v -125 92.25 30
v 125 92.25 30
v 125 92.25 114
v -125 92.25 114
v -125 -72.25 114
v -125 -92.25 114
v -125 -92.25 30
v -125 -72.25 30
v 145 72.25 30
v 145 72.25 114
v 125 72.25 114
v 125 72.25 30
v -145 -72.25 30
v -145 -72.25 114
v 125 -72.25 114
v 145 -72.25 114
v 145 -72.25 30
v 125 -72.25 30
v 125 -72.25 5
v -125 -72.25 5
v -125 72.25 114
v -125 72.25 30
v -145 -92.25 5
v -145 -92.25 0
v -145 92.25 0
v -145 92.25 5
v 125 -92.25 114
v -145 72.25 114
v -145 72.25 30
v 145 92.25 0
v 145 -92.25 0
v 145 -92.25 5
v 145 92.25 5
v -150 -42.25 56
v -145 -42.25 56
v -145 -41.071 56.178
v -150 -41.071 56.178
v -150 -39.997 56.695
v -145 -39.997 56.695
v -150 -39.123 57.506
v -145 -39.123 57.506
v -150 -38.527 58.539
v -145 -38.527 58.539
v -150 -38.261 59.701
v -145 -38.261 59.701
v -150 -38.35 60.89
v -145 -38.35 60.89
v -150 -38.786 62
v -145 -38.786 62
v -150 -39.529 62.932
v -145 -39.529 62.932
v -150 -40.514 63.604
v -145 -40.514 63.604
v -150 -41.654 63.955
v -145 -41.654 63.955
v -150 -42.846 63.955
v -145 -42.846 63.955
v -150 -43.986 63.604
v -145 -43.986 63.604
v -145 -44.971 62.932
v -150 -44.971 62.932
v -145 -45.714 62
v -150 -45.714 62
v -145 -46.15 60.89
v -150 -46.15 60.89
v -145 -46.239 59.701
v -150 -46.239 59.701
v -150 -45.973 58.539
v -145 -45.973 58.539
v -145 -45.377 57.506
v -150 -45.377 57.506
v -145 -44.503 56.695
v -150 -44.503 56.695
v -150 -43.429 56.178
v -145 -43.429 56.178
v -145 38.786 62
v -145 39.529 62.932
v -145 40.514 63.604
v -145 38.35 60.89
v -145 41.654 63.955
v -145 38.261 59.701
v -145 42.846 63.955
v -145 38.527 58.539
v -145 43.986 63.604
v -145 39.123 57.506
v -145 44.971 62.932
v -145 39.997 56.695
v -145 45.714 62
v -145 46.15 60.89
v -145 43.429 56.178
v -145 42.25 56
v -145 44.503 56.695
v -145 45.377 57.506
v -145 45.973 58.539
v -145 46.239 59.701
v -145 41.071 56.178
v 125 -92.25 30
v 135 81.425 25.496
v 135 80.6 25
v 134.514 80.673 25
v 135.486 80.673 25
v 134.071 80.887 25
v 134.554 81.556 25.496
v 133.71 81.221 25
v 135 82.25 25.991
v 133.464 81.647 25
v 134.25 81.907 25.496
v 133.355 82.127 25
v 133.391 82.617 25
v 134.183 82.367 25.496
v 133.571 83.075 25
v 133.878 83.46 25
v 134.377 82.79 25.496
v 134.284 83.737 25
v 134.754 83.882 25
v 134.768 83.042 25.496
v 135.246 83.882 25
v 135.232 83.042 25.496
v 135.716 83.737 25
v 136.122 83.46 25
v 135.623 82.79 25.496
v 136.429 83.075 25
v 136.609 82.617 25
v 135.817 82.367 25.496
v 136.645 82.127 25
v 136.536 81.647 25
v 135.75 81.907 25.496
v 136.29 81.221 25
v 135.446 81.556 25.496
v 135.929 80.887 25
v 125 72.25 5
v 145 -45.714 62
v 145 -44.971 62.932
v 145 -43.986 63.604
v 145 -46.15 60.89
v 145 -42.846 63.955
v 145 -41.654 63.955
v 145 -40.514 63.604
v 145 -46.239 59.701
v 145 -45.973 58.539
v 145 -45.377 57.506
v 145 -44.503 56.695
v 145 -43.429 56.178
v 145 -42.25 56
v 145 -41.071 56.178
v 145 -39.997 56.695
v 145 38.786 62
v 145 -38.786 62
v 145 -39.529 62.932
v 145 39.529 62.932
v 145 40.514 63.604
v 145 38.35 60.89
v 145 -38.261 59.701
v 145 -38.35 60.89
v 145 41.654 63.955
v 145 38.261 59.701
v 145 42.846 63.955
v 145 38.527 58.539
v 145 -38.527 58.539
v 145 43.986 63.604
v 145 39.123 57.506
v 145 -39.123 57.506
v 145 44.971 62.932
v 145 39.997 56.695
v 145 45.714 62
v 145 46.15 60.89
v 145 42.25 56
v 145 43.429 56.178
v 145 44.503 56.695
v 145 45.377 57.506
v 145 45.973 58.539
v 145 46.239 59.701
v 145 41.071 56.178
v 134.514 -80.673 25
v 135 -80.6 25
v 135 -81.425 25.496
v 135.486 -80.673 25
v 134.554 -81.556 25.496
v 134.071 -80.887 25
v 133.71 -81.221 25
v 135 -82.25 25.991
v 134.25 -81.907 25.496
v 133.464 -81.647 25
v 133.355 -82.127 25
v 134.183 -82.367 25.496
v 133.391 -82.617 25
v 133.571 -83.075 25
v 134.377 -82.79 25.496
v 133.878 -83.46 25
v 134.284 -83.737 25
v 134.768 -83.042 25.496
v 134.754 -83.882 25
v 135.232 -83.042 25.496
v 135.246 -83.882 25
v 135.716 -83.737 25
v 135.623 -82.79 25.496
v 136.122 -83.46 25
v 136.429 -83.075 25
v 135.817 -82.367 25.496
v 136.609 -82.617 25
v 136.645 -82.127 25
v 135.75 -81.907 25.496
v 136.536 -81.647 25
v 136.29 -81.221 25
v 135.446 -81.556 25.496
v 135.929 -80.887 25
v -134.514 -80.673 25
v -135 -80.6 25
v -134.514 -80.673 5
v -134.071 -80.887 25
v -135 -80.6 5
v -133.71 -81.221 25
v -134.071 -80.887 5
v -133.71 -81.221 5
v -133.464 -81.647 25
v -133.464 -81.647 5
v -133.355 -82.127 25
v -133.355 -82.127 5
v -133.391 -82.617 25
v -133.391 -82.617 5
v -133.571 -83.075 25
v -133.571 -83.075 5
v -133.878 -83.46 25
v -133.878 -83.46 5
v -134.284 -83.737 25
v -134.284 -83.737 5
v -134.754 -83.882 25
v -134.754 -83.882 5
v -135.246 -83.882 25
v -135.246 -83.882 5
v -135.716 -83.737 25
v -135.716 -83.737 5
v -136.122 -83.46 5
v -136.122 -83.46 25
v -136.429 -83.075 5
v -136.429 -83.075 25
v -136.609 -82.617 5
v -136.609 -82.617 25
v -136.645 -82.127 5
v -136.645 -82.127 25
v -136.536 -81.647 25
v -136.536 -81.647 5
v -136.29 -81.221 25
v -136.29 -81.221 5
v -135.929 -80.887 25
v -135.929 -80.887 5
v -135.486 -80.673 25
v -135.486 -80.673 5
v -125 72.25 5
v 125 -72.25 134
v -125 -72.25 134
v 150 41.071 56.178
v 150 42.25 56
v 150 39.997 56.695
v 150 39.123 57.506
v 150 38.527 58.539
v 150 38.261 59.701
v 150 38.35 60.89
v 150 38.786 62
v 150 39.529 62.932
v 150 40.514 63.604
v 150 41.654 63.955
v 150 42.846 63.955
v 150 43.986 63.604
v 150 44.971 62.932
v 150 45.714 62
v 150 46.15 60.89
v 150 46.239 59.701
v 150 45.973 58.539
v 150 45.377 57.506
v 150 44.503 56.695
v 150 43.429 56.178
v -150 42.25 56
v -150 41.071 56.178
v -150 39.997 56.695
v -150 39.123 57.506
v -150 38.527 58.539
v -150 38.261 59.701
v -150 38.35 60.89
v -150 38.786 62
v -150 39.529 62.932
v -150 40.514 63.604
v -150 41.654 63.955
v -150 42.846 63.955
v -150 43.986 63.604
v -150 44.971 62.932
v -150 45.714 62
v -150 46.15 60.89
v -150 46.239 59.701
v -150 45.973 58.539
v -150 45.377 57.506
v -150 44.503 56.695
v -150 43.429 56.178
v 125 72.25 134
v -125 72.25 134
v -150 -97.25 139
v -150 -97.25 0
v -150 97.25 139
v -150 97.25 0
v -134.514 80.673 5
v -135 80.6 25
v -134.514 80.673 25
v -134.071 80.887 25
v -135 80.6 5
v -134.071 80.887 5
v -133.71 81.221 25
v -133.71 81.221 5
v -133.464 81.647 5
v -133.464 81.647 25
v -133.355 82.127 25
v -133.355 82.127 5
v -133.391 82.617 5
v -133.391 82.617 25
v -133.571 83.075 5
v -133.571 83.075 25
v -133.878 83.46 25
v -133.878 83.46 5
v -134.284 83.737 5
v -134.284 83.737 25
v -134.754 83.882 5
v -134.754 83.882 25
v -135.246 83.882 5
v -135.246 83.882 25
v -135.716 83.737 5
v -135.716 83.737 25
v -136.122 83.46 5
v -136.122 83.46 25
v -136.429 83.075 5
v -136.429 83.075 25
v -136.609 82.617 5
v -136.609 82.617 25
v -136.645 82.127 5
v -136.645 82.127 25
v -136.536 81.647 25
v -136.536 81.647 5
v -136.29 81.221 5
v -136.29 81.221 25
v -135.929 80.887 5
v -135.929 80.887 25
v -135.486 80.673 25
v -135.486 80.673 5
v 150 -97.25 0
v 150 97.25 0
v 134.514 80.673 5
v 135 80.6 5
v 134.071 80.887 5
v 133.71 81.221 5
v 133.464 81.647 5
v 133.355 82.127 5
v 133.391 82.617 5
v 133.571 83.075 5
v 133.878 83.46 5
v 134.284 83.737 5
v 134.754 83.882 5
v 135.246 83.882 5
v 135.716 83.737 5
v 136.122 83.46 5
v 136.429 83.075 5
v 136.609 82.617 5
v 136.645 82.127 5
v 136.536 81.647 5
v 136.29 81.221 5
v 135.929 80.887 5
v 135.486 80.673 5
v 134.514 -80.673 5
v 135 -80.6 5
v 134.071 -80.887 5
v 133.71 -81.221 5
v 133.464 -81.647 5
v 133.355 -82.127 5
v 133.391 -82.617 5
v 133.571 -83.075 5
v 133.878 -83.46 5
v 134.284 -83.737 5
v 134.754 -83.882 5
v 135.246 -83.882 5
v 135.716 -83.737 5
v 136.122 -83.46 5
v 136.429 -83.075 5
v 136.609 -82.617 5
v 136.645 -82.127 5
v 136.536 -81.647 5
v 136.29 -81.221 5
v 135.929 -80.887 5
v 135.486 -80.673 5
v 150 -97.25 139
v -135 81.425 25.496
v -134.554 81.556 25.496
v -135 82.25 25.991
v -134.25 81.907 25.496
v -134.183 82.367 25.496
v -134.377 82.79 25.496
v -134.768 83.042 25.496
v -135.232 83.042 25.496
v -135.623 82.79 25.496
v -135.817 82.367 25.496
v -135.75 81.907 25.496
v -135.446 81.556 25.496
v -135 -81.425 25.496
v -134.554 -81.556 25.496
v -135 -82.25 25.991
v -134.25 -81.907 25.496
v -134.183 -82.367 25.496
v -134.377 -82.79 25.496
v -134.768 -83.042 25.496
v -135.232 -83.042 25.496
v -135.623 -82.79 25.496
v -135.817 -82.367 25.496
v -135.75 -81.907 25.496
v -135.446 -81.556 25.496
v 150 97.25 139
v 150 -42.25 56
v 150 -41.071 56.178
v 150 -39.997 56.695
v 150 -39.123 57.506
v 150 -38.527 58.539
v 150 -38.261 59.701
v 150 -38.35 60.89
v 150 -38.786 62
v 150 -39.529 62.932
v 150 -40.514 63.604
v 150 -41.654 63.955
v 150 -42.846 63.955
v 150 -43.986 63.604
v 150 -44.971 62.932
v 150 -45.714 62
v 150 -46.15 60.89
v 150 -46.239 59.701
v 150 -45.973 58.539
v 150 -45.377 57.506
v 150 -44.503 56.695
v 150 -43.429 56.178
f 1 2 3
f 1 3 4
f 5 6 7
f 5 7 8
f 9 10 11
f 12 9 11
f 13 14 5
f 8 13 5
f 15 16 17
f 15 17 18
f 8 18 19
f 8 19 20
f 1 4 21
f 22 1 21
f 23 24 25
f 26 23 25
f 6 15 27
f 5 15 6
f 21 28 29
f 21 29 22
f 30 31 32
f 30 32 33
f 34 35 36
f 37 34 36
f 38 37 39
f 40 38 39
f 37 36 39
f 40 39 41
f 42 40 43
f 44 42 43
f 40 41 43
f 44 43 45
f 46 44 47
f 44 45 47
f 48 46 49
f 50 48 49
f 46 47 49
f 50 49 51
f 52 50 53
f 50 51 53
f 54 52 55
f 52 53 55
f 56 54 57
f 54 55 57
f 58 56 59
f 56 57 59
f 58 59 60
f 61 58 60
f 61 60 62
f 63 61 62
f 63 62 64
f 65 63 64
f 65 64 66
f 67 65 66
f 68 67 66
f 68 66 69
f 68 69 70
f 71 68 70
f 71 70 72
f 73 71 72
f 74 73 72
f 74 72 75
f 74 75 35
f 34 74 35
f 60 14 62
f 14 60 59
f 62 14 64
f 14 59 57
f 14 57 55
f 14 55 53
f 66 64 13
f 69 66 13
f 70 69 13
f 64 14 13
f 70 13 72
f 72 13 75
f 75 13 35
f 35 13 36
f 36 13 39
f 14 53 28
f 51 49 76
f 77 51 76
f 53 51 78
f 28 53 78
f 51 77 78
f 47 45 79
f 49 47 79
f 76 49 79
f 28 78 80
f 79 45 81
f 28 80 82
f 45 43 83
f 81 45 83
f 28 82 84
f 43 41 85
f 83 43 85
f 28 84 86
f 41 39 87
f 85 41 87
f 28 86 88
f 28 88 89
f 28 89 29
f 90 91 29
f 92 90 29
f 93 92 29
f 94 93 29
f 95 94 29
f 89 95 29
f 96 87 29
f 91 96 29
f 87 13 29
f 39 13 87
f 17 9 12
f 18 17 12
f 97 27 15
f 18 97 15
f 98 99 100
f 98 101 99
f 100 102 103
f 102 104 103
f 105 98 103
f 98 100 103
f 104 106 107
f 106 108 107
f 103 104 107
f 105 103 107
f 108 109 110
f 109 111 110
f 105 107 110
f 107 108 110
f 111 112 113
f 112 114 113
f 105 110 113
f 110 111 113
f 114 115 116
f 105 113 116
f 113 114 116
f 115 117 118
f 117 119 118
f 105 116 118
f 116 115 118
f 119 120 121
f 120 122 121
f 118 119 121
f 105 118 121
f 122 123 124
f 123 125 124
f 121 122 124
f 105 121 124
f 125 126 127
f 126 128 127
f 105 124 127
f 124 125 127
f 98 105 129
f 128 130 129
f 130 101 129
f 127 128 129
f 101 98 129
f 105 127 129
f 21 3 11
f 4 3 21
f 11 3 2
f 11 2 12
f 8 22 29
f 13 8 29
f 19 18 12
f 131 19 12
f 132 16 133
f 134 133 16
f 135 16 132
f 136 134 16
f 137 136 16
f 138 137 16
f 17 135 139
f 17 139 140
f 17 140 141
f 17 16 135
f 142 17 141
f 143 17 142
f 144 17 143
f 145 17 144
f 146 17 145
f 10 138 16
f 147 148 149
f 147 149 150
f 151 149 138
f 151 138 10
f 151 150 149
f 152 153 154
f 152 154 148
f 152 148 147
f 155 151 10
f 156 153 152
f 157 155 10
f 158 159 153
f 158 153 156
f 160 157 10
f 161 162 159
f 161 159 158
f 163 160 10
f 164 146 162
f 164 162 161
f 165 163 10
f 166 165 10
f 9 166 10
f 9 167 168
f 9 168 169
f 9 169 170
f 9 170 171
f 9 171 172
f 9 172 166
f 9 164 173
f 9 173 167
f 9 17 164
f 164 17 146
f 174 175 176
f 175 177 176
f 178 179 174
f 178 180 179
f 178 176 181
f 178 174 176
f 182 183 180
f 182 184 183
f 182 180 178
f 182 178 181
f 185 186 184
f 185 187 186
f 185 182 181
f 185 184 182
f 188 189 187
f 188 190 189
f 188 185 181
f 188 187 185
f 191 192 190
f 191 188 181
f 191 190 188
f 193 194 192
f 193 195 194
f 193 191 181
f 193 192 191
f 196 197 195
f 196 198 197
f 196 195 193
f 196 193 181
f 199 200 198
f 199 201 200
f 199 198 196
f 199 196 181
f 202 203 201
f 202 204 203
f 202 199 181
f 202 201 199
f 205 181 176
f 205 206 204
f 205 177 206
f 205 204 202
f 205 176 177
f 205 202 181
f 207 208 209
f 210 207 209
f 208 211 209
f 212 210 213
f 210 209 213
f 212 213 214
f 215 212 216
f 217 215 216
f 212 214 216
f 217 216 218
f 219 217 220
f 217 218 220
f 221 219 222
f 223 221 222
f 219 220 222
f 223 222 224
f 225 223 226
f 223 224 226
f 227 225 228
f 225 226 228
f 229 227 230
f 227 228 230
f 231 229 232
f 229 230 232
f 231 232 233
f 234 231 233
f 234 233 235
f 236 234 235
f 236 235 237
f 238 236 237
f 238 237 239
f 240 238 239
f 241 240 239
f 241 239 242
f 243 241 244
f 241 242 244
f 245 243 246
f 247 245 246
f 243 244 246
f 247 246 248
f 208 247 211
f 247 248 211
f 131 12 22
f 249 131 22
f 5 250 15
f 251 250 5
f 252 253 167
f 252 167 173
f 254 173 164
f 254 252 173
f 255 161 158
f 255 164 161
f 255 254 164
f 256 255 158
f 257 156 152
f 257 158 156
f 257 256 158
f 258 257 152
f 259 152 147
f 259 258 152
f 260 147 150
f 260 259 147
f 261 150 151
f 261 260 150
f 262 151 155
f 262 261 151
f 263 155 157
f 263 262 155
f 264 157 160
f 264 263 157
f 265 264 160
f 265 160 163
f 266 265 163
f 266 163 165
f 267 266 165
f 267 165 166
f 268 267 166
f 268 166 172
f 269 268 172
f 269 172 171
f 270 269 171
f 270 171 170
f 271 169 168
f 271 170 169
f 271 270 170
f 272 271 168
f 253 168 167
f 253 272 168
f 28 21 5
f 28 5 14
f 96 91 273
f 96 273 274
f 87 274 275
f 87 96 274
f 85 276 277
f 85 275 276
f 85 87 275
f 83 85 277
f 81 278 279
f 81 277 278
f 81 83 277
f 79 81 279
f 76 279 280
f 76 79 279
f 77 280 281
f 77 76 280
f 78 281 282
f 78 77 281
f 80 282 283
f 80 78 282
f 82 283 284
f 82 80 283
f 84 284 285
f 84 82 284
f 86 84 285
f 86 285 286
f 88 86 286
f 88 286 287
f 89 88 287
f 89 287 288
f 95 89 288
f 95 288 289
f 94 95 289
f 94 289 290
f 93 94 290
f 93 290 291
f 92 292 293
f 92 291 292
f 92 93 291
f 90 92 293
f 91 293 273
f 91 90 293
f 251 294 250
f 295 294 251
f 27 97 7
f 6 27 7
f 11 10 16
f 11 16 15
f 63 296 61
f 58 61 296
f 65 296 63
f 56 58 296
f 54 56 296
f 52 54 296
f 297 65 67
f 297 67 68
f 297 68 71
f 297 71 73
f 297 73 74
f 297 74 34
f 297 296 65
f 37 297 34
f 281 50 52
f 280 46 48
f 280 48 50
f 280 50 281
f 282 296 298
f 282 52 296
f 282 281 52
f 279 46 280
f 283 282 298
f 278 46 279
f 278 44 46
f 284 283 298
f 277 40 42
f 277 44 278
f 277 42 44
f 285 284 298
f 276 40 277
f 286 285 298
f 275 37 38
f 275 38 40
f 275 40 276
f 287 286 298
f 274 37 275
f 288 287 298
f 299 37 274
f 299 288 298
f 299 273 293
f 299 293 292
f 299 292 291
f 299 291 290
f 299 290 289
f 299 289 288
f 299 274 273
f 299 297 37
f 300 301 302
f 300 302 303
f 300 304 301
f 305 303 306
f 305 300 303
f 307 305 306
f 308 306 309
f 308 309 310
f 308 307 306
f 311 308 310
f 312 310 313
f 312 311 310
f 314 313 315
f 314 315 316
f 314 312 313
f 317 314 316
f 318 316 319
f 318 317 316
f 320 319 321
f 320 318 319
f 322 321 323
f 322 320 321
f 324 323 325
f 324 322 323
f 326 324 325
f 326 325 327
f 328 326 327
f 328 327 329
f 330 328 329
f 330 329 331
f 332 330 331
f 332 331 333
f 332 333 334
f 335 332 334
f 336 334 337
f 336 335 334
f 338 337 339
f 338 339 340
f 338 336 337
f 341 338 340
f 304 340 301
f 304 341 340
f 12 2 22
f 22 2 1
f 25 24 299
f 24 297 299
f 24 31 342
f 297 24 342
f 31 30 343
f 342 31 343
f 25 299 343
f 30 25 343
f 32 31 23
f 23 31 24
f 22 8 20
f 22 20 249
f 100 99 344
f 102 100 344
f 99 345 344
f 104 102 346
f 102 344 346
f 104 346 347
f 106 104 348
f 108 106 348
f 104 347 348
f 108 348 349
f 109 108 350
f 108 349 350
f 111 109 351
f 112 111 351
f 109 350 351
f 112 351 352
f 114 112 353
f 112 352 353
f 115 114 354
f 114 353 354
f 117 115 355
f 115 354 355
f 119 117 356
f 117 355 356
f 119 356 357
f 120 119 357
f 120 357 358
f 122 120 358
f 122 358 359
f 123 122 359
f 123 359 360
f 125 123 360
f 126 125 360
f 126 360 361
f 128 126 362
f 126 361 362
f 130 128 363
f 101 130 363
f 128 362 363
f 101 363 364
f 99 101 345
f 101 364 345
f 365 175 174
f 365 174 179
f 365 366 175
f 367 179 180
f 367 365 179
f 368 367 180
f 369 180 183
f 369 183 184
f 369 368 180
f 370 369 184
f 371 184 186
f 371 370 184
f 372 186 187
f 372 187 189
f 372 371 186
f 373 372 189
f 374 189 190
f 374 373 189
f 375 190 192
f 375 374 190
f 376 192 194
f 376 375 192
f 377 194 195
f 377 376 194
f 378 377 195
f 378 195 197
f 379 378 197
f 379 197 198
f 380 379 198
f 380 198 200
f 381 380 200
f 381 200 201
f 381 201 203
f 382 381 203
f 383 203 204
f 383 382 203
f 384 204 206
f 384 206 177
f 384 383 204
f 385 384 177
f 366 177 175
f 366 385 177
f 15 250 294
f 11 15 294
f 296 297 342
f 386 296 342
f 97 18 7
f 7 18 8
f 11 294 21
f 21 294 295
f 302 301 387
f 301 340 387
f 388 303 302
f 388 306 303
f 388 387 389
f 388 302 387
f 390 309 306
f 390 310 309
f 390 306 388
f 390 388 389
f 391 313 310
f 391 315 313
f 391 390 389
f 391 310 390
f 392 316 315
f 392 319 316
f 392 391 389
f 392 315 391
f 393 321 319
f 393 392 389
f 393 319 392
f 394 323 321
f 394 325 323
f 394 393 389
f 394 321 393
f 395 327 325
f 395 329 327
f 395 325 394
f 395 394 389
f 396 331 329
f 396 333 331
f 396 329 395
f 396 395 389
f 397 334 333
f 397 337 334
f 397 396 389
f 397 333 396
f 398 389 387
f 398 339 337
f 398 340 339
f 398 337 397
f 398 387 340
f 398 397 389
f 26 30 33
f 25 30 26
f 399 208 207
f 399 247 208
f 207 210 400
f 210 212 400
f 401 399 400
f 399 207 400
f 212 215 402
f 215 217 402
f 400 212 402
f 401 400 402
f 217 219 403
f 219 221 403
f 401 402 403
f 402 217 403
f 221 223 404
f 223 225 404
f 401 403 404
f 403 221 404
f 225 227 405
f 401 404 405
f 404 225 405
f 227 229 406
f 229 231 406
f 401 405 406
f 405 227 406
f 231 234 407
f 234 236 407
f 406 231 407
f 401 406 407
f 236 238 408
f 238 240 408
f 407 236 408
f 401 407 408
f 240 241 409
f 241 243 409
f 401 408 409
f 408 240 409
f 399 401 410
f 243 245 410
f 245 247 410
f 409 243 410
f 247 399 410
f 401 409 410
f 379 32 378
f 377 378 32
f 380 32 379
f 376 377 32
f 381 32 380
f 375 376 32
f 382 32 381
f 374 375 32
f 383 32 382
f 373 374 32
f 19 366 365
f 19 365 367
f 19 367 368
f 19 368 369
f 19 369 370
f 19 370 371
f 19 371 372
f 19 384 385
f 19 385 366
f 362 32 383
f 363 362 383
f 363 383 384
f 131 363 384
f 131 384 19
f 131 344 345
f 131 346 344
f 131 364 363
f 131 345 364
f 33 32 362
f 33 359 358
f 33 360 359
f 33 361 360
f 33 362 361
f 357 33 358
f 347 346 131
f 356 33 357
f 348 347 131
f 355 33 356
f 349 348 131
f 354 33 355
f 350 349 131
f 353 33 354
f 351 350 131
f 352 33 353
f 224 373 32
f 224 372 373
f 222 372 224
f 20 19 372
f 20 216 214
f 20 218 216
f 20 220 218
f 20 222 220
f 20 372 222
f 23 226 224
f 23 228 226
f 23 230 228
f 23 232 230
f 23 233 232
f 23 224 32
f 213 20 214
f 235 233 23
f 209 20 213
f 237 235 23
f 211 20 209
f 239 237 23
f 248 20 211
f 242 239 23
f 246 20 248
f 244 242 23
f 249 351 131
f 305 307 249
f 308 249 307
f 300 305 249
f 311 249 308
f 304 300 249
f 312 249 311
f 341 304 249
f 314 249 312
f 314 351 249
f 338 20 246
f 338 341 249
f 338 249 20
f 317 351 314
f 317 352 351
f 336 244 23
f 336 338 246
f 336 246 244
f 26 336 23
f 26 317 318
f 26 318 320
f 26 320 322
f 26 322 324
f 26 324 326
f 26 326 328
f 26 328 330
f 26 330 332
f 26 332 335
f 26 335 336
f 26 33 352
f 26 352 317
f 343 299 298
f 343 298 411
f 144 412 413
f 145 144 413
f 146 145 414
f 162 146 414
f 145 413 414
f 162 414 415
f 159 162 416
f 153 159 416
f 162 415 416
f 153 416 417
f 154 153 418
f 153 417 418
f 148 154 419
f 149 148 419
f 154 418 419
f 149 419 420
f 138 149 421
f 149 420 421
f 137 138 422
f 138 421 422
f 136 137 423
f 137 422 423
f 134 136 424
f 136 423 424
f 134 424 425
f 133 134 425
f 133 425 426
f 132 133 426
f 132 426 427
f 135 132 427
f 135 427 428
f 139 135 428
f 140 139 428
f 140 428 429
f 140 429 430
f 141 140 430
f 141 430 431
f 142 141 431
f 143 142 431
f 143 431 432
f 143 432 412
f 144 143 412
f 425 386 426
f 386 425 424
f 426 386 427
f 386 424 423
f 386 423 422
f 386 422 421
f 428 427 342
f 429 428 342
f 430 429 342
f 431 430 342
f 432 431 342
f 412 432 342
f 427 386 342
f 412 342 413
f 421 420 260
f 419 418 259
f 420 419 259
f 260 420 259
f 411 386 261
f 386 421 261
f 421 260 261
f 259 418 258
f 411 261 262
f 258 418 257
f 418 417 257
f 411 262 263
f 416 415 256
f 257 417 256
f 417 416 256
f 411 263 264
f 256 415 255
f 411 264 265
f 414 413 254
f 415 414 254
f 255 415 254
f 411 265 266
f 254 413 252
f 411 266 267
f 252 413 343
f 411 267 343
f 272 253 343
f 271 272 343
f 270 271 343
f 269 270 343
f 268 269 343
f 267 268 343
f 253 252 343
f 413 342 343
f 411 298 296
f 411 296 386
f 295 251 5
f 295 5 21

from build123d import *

# Parameters (mm, degrees)
SKIZZE1_W                       = 300
SKIZZE1_H                       = 194.5
AUFSATZ_LINEAR_AUSTRAGEN1_DEPTH = 139
SKIZZE2_W                       = 290
SKIZZE2_H                       = 184.5
SCHNITT_LINEAR_AUSTRAGEN1_DEPTH = 134
F_8_0MM_STIFTLOCH1_D            = 8
SKIZZE8_W                       = 290
SKIZZE8_H                       = 184.5
SKIZZE8_W_2                     = 250
SKIZZE8_H_2                     = 144.5
AUFSATZ_LINEAR_AUSTRAGEN2_DEPTH = 25
AUFSATZ_LINEAR_AUSTRAGEN3_REACH = 211.377
SKIZZE9_W                       = 20
SKIZZE9_H                       = 20
SPIEGELN5_COPY_1_REACH          = 211.377
SPIEGELN5_COPY_1_SKETCH_W       = 20
SPIEGELN5_COPY_1_SKETCH_H       = 20
SKIZZE16_W                      = 290
SKIZZE16_H                      = 184.5
SKIZZE16_W_2                    = 250
SKIZZE16_H_2                    = 144.5
AUFSATZ_LINEAR_AUSTRAGEN4_DEPTH = 20


with BuildPart() as part:
    # Skizze1 → Aufsatz-Linear austragen1 (new body)
    with BuildSketch(Plane.XY):
        Rectangle(SKIZZE1_W, SKIZZE1_H)
    extrude(amount=AUFSATZ_LINEAR_AUSTRAGEN1_DEPTH)

    # Skizze2 → Schnitt-Linear austragen1 (cut)
    with BuildSketch(Plane(origin=(0, 0, 0), x_dir=(-1, 0, 0), z_dir=(0, 0, -1))):
        Rectangle(SKIZZE2_W, SKIZZE2_H)
    extrude(amount=-SCHNITT_LINEAR_AUSTRAGEN1_DEPTH, mode=Mode.SUBTRACT)

    # Ø8.0mm Stiftloch1 (through all)
    with Locations(Plane.ZY.offset(150)):
        with Locations((60, -42.25)):
            f_8_0mm_stiftloch1 = Hole(F_8_0MM_STIFTLOCH1_D / 2)

    # Spiegeln1: Ø8.0mm Stiftloch1 across plane
    add(f_8_0mm_stiftloch1.mirror(Plane.ZX), mode=Mode.SUBTRACT)

    # Skizze8 → Aufsatz-Linear austragen2 (add)
    with BuildSketch(Plane(origin=(0, 0, 30), x_dir=(-1, 0, 0), z_dir=(0, 0, -1))):
        Rectangle(SKIZZE8_W, SKIZZE8_H)
        Rectangle(SKIZZE8_W_2, SKIZZE8_H_2, mode=Mode.SUBTRACT)
    extrude(amount=AUFSATZ_LINEAR_AUSTRAGEN2_DEPTH)

    # Skizze9 → Aufsatz-Linear austragen3 (add, up to next)
    with BuildSketch(Plane(origin=(0, 0, 30), x_dir=(-1, 0, 0), z_dir=(0, 0, -1)), mode=Mode.PRIVATE) as aufsatz_linear_austragen3_sk1:
        with Locations((-135, -82.25)):
            Rectangle(SKIZZE9_W, SKIZZE9_H)
    aufsatz_linear_austragen3_tool1 = extrude(aufsatz_linear_austragen3_sk1.sketch, amount=-AUFSATZ_LINEAR_AUSTRAGEN3_REACH, mode=Mode.PRIVATE) - part.part
    aufsatz_linear_austragen3 = aufsatz_linear_austragen3_tool1.solids().sort_by_distance((135, -82.25, 30))[0]
    add(aufsatz_linear_austragen3)

    # Skizze15 → Kernloch für M4x0.71 (revolve, cut)
    with BuildSketch(Plane(origin=(135, -82.25, 5), x_dir=(0, 1, 0), z_dir=(1, 0, 0))):
        Polygon((0, 0), (0, 20.991420021), (1.65, 20), (1.65, 0), align=None)
    kernloch_f_r_m4x0_71 = revolve(axis=Axis((135, -82.25, -1.35), (0, 0, 1)), mode=Mode.SUBTRACT)

    # Spiegeln4: Aufsatz-Linear austragen3, Kernloch für M4x0.71 across plane
    add(aufsatz_linear_austragen3.mirror(Plane.ZX))
    add(kernloch_f_r_m4x0_71.mirror(Plane.ZX), mode=Mode.SUBTRACT)

    # Spiegeln5: Aufsatz-Linear austragen3, Kernloch für M4x0.71 across plane
    add(aufsatz_linear_austragen3.mirror(Plane(origin=(0, 0, 0), x_dir=(0, 0, 1), z_dir=(1, 0, 0))))
    add(kernloch_f_r_m4x0_71.mirror(Plane(origin=(0, 0, 0), x_dir=(0, 0, 1), z_dir=(1, 0, 0))), mode=Mode.SUBTRACT)

    # Spiegeln5 copy 1 sketch → Spiegeln5 copy 1 (add, up to next)
    with BuildSketch(Plane(origin=(0, 0, 30), x_dir=(1, 0, 0), z_dir=(0, 0, -1)), mode=Mode.PRIVATE) as spiegeln5_copy_1_sk1:
        with Locations((-135, -82.25)):
            Rectangle(SPIEGELN5_COPY_1_SKETCH_W, SPIEGELN5_COPY_1_SKETCH_H)
    spiegeln5_copy_1_tool1 = extrude(spiegeln5_copy_1_sk1.sketch, amount=-SPIEGELN5_COPY_1_REACH, mode=Mode.PRIVATE) - part.part
    add(spiegeln5_copy_1_tool1.solids().sort_by_distance((-135, 82.25, 30))[0])

    # Spiegeln5 copy 2 sketch → Spiegeln5 copy 2 (revolve, cut)
    with BuildSketch(Plane(origin=(-135, 82.25, 5), x_dir=(0, -1, 0), z_dir=(-1, 0, 0))):
        Polygon((0, 0), (0, 20.991420021), (1.65, 20), (1.65, 0), align=None)
    revolve(axis=Axis((-135, 82.25, -1.35), (0, 0, 1)), mode=Mode.SUBTRACT)

    # Skizze16 → Aufsatz-Linear austragen4 (add)
    with BuildSketch(Plane(origin=(0, 0, 134), x_dir=(-1, 0, 0), z_dir=(0, 0, -1))):
        Rectangle(SKIZZE16_W, SKIZZE16_H)
        Rectangle(SKIZZE16_W_2, SKIZZE16_H_2, mode=Mode.SUBTRACT)
    extrude(amount=AUFSATZ_LINEAR_AUSTRAGEN4_DEPTH)


solid = part.part
